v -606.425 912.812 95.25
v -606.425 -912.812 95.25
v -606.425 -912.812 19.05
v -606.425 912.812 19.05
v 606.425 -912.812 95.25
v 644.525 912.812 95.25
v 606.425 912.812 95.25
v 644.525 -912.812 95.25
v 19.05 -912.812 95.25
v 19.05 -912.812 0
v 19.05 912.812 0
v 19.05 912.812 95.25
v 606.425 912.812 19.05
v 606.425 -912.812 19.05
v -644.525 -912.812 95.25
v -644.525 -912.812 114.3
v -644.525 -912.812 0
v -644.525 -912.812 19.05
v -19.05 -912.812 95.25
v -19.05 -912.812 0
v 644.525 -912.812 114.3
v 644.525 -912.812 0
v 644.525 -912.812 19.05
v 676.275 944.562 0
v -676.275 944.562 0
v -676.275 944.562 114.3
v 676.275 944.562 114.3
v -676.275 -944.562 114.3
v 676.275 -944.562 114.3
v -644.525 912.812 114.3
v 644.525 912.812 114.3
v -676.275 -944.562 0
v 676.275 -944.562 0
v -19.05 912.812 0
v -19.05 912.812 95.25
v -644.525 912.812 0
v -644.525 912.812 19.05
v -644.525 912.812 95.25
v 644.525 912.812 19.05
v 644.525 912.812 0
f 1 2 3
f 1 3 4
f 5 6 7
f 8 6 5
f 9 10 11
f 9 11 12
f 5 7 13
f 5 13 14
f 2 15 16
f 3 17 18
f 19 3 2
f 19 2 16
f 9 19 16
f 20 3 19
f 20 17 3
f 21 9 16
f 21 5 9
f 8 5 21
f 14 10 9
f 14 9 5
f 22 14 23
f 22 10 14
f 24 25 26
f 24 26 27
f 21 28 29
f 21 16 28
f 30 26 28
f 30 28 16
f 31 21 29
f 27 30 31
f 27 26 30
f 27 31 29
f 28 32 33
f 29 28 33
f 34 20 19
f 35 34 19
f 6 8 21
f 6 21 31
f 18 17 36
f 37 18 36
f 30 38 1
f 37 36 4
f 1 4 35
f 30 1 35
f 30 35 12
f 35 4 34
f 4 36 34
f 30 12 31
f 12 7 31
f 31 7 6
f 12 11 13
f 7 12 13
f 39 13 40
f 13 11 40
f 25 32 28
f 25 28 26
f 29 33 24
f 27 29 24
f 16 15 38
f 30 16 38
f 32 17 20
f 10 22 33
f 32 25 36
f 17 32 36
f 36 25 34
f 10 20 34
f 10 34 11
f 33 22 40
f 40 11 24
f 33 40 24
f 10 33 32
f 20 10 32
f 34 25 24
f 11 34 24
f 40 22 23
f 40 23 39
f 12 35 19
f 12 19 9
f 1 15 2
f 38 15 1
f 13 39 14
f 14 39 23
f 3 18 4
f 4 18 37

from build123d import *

# Parameters (mm, degrees)
F0_W     = 1352.55
F0_H     = 1889.125
F0_W_2   = 1289.05
F0_H_2   = 1825.625
F1_DEPTH = 114.3
F2_W     = 1825.625
F2_H     = 76.2
F3_DEPTH = 38.1
F4_W     = 1825.625
F4_H     = 76.2
F5_DEPTH = 38.1
F6_W     = 38.1
F6_H     = 95.25
F7_DEPTH = 1825.625


with BuildPart() as f1:
    # F0 (on Top) → F1 (new body)
    with BuildSketch(Plane.XY):
        Rectangle(F0_W, F0_H)
        Rectangle(F0_W_2, F0_H_2, mode=Mode.SUBTRACT)
    extrude(amount=F1_DEPTH)

    # F2 (on face) → F3 (join)
    with BuildSketch(Plane(origin=(644.525, 0, 0), x_dir=(0, -1, 0), z_dir=(-1, 0, 0))):
        with Locations((0, 57.15)):
            Rectangle(F2_W, F2_H)
    extrude(amount=F3_DEPTH)

    # F4 (on face) → F5 (join)
    with BuildSketch(Plane.YZ.offset(-644.525)):
        with Locations((0, 57.15)):
            Rectangle(F4_W, F4_H)
    extrude(amount=F5_DEPTH)

    # F6 (on face) → F7 (join, through all)
    with BuildSketch(Plane.XZ.offset(-912.8125)):
        with Locations((0, 47.625)):
            Rectangle(F6_W, F6_H)
    extrude(amount=F7_DEPTH)


solid = f1.part
